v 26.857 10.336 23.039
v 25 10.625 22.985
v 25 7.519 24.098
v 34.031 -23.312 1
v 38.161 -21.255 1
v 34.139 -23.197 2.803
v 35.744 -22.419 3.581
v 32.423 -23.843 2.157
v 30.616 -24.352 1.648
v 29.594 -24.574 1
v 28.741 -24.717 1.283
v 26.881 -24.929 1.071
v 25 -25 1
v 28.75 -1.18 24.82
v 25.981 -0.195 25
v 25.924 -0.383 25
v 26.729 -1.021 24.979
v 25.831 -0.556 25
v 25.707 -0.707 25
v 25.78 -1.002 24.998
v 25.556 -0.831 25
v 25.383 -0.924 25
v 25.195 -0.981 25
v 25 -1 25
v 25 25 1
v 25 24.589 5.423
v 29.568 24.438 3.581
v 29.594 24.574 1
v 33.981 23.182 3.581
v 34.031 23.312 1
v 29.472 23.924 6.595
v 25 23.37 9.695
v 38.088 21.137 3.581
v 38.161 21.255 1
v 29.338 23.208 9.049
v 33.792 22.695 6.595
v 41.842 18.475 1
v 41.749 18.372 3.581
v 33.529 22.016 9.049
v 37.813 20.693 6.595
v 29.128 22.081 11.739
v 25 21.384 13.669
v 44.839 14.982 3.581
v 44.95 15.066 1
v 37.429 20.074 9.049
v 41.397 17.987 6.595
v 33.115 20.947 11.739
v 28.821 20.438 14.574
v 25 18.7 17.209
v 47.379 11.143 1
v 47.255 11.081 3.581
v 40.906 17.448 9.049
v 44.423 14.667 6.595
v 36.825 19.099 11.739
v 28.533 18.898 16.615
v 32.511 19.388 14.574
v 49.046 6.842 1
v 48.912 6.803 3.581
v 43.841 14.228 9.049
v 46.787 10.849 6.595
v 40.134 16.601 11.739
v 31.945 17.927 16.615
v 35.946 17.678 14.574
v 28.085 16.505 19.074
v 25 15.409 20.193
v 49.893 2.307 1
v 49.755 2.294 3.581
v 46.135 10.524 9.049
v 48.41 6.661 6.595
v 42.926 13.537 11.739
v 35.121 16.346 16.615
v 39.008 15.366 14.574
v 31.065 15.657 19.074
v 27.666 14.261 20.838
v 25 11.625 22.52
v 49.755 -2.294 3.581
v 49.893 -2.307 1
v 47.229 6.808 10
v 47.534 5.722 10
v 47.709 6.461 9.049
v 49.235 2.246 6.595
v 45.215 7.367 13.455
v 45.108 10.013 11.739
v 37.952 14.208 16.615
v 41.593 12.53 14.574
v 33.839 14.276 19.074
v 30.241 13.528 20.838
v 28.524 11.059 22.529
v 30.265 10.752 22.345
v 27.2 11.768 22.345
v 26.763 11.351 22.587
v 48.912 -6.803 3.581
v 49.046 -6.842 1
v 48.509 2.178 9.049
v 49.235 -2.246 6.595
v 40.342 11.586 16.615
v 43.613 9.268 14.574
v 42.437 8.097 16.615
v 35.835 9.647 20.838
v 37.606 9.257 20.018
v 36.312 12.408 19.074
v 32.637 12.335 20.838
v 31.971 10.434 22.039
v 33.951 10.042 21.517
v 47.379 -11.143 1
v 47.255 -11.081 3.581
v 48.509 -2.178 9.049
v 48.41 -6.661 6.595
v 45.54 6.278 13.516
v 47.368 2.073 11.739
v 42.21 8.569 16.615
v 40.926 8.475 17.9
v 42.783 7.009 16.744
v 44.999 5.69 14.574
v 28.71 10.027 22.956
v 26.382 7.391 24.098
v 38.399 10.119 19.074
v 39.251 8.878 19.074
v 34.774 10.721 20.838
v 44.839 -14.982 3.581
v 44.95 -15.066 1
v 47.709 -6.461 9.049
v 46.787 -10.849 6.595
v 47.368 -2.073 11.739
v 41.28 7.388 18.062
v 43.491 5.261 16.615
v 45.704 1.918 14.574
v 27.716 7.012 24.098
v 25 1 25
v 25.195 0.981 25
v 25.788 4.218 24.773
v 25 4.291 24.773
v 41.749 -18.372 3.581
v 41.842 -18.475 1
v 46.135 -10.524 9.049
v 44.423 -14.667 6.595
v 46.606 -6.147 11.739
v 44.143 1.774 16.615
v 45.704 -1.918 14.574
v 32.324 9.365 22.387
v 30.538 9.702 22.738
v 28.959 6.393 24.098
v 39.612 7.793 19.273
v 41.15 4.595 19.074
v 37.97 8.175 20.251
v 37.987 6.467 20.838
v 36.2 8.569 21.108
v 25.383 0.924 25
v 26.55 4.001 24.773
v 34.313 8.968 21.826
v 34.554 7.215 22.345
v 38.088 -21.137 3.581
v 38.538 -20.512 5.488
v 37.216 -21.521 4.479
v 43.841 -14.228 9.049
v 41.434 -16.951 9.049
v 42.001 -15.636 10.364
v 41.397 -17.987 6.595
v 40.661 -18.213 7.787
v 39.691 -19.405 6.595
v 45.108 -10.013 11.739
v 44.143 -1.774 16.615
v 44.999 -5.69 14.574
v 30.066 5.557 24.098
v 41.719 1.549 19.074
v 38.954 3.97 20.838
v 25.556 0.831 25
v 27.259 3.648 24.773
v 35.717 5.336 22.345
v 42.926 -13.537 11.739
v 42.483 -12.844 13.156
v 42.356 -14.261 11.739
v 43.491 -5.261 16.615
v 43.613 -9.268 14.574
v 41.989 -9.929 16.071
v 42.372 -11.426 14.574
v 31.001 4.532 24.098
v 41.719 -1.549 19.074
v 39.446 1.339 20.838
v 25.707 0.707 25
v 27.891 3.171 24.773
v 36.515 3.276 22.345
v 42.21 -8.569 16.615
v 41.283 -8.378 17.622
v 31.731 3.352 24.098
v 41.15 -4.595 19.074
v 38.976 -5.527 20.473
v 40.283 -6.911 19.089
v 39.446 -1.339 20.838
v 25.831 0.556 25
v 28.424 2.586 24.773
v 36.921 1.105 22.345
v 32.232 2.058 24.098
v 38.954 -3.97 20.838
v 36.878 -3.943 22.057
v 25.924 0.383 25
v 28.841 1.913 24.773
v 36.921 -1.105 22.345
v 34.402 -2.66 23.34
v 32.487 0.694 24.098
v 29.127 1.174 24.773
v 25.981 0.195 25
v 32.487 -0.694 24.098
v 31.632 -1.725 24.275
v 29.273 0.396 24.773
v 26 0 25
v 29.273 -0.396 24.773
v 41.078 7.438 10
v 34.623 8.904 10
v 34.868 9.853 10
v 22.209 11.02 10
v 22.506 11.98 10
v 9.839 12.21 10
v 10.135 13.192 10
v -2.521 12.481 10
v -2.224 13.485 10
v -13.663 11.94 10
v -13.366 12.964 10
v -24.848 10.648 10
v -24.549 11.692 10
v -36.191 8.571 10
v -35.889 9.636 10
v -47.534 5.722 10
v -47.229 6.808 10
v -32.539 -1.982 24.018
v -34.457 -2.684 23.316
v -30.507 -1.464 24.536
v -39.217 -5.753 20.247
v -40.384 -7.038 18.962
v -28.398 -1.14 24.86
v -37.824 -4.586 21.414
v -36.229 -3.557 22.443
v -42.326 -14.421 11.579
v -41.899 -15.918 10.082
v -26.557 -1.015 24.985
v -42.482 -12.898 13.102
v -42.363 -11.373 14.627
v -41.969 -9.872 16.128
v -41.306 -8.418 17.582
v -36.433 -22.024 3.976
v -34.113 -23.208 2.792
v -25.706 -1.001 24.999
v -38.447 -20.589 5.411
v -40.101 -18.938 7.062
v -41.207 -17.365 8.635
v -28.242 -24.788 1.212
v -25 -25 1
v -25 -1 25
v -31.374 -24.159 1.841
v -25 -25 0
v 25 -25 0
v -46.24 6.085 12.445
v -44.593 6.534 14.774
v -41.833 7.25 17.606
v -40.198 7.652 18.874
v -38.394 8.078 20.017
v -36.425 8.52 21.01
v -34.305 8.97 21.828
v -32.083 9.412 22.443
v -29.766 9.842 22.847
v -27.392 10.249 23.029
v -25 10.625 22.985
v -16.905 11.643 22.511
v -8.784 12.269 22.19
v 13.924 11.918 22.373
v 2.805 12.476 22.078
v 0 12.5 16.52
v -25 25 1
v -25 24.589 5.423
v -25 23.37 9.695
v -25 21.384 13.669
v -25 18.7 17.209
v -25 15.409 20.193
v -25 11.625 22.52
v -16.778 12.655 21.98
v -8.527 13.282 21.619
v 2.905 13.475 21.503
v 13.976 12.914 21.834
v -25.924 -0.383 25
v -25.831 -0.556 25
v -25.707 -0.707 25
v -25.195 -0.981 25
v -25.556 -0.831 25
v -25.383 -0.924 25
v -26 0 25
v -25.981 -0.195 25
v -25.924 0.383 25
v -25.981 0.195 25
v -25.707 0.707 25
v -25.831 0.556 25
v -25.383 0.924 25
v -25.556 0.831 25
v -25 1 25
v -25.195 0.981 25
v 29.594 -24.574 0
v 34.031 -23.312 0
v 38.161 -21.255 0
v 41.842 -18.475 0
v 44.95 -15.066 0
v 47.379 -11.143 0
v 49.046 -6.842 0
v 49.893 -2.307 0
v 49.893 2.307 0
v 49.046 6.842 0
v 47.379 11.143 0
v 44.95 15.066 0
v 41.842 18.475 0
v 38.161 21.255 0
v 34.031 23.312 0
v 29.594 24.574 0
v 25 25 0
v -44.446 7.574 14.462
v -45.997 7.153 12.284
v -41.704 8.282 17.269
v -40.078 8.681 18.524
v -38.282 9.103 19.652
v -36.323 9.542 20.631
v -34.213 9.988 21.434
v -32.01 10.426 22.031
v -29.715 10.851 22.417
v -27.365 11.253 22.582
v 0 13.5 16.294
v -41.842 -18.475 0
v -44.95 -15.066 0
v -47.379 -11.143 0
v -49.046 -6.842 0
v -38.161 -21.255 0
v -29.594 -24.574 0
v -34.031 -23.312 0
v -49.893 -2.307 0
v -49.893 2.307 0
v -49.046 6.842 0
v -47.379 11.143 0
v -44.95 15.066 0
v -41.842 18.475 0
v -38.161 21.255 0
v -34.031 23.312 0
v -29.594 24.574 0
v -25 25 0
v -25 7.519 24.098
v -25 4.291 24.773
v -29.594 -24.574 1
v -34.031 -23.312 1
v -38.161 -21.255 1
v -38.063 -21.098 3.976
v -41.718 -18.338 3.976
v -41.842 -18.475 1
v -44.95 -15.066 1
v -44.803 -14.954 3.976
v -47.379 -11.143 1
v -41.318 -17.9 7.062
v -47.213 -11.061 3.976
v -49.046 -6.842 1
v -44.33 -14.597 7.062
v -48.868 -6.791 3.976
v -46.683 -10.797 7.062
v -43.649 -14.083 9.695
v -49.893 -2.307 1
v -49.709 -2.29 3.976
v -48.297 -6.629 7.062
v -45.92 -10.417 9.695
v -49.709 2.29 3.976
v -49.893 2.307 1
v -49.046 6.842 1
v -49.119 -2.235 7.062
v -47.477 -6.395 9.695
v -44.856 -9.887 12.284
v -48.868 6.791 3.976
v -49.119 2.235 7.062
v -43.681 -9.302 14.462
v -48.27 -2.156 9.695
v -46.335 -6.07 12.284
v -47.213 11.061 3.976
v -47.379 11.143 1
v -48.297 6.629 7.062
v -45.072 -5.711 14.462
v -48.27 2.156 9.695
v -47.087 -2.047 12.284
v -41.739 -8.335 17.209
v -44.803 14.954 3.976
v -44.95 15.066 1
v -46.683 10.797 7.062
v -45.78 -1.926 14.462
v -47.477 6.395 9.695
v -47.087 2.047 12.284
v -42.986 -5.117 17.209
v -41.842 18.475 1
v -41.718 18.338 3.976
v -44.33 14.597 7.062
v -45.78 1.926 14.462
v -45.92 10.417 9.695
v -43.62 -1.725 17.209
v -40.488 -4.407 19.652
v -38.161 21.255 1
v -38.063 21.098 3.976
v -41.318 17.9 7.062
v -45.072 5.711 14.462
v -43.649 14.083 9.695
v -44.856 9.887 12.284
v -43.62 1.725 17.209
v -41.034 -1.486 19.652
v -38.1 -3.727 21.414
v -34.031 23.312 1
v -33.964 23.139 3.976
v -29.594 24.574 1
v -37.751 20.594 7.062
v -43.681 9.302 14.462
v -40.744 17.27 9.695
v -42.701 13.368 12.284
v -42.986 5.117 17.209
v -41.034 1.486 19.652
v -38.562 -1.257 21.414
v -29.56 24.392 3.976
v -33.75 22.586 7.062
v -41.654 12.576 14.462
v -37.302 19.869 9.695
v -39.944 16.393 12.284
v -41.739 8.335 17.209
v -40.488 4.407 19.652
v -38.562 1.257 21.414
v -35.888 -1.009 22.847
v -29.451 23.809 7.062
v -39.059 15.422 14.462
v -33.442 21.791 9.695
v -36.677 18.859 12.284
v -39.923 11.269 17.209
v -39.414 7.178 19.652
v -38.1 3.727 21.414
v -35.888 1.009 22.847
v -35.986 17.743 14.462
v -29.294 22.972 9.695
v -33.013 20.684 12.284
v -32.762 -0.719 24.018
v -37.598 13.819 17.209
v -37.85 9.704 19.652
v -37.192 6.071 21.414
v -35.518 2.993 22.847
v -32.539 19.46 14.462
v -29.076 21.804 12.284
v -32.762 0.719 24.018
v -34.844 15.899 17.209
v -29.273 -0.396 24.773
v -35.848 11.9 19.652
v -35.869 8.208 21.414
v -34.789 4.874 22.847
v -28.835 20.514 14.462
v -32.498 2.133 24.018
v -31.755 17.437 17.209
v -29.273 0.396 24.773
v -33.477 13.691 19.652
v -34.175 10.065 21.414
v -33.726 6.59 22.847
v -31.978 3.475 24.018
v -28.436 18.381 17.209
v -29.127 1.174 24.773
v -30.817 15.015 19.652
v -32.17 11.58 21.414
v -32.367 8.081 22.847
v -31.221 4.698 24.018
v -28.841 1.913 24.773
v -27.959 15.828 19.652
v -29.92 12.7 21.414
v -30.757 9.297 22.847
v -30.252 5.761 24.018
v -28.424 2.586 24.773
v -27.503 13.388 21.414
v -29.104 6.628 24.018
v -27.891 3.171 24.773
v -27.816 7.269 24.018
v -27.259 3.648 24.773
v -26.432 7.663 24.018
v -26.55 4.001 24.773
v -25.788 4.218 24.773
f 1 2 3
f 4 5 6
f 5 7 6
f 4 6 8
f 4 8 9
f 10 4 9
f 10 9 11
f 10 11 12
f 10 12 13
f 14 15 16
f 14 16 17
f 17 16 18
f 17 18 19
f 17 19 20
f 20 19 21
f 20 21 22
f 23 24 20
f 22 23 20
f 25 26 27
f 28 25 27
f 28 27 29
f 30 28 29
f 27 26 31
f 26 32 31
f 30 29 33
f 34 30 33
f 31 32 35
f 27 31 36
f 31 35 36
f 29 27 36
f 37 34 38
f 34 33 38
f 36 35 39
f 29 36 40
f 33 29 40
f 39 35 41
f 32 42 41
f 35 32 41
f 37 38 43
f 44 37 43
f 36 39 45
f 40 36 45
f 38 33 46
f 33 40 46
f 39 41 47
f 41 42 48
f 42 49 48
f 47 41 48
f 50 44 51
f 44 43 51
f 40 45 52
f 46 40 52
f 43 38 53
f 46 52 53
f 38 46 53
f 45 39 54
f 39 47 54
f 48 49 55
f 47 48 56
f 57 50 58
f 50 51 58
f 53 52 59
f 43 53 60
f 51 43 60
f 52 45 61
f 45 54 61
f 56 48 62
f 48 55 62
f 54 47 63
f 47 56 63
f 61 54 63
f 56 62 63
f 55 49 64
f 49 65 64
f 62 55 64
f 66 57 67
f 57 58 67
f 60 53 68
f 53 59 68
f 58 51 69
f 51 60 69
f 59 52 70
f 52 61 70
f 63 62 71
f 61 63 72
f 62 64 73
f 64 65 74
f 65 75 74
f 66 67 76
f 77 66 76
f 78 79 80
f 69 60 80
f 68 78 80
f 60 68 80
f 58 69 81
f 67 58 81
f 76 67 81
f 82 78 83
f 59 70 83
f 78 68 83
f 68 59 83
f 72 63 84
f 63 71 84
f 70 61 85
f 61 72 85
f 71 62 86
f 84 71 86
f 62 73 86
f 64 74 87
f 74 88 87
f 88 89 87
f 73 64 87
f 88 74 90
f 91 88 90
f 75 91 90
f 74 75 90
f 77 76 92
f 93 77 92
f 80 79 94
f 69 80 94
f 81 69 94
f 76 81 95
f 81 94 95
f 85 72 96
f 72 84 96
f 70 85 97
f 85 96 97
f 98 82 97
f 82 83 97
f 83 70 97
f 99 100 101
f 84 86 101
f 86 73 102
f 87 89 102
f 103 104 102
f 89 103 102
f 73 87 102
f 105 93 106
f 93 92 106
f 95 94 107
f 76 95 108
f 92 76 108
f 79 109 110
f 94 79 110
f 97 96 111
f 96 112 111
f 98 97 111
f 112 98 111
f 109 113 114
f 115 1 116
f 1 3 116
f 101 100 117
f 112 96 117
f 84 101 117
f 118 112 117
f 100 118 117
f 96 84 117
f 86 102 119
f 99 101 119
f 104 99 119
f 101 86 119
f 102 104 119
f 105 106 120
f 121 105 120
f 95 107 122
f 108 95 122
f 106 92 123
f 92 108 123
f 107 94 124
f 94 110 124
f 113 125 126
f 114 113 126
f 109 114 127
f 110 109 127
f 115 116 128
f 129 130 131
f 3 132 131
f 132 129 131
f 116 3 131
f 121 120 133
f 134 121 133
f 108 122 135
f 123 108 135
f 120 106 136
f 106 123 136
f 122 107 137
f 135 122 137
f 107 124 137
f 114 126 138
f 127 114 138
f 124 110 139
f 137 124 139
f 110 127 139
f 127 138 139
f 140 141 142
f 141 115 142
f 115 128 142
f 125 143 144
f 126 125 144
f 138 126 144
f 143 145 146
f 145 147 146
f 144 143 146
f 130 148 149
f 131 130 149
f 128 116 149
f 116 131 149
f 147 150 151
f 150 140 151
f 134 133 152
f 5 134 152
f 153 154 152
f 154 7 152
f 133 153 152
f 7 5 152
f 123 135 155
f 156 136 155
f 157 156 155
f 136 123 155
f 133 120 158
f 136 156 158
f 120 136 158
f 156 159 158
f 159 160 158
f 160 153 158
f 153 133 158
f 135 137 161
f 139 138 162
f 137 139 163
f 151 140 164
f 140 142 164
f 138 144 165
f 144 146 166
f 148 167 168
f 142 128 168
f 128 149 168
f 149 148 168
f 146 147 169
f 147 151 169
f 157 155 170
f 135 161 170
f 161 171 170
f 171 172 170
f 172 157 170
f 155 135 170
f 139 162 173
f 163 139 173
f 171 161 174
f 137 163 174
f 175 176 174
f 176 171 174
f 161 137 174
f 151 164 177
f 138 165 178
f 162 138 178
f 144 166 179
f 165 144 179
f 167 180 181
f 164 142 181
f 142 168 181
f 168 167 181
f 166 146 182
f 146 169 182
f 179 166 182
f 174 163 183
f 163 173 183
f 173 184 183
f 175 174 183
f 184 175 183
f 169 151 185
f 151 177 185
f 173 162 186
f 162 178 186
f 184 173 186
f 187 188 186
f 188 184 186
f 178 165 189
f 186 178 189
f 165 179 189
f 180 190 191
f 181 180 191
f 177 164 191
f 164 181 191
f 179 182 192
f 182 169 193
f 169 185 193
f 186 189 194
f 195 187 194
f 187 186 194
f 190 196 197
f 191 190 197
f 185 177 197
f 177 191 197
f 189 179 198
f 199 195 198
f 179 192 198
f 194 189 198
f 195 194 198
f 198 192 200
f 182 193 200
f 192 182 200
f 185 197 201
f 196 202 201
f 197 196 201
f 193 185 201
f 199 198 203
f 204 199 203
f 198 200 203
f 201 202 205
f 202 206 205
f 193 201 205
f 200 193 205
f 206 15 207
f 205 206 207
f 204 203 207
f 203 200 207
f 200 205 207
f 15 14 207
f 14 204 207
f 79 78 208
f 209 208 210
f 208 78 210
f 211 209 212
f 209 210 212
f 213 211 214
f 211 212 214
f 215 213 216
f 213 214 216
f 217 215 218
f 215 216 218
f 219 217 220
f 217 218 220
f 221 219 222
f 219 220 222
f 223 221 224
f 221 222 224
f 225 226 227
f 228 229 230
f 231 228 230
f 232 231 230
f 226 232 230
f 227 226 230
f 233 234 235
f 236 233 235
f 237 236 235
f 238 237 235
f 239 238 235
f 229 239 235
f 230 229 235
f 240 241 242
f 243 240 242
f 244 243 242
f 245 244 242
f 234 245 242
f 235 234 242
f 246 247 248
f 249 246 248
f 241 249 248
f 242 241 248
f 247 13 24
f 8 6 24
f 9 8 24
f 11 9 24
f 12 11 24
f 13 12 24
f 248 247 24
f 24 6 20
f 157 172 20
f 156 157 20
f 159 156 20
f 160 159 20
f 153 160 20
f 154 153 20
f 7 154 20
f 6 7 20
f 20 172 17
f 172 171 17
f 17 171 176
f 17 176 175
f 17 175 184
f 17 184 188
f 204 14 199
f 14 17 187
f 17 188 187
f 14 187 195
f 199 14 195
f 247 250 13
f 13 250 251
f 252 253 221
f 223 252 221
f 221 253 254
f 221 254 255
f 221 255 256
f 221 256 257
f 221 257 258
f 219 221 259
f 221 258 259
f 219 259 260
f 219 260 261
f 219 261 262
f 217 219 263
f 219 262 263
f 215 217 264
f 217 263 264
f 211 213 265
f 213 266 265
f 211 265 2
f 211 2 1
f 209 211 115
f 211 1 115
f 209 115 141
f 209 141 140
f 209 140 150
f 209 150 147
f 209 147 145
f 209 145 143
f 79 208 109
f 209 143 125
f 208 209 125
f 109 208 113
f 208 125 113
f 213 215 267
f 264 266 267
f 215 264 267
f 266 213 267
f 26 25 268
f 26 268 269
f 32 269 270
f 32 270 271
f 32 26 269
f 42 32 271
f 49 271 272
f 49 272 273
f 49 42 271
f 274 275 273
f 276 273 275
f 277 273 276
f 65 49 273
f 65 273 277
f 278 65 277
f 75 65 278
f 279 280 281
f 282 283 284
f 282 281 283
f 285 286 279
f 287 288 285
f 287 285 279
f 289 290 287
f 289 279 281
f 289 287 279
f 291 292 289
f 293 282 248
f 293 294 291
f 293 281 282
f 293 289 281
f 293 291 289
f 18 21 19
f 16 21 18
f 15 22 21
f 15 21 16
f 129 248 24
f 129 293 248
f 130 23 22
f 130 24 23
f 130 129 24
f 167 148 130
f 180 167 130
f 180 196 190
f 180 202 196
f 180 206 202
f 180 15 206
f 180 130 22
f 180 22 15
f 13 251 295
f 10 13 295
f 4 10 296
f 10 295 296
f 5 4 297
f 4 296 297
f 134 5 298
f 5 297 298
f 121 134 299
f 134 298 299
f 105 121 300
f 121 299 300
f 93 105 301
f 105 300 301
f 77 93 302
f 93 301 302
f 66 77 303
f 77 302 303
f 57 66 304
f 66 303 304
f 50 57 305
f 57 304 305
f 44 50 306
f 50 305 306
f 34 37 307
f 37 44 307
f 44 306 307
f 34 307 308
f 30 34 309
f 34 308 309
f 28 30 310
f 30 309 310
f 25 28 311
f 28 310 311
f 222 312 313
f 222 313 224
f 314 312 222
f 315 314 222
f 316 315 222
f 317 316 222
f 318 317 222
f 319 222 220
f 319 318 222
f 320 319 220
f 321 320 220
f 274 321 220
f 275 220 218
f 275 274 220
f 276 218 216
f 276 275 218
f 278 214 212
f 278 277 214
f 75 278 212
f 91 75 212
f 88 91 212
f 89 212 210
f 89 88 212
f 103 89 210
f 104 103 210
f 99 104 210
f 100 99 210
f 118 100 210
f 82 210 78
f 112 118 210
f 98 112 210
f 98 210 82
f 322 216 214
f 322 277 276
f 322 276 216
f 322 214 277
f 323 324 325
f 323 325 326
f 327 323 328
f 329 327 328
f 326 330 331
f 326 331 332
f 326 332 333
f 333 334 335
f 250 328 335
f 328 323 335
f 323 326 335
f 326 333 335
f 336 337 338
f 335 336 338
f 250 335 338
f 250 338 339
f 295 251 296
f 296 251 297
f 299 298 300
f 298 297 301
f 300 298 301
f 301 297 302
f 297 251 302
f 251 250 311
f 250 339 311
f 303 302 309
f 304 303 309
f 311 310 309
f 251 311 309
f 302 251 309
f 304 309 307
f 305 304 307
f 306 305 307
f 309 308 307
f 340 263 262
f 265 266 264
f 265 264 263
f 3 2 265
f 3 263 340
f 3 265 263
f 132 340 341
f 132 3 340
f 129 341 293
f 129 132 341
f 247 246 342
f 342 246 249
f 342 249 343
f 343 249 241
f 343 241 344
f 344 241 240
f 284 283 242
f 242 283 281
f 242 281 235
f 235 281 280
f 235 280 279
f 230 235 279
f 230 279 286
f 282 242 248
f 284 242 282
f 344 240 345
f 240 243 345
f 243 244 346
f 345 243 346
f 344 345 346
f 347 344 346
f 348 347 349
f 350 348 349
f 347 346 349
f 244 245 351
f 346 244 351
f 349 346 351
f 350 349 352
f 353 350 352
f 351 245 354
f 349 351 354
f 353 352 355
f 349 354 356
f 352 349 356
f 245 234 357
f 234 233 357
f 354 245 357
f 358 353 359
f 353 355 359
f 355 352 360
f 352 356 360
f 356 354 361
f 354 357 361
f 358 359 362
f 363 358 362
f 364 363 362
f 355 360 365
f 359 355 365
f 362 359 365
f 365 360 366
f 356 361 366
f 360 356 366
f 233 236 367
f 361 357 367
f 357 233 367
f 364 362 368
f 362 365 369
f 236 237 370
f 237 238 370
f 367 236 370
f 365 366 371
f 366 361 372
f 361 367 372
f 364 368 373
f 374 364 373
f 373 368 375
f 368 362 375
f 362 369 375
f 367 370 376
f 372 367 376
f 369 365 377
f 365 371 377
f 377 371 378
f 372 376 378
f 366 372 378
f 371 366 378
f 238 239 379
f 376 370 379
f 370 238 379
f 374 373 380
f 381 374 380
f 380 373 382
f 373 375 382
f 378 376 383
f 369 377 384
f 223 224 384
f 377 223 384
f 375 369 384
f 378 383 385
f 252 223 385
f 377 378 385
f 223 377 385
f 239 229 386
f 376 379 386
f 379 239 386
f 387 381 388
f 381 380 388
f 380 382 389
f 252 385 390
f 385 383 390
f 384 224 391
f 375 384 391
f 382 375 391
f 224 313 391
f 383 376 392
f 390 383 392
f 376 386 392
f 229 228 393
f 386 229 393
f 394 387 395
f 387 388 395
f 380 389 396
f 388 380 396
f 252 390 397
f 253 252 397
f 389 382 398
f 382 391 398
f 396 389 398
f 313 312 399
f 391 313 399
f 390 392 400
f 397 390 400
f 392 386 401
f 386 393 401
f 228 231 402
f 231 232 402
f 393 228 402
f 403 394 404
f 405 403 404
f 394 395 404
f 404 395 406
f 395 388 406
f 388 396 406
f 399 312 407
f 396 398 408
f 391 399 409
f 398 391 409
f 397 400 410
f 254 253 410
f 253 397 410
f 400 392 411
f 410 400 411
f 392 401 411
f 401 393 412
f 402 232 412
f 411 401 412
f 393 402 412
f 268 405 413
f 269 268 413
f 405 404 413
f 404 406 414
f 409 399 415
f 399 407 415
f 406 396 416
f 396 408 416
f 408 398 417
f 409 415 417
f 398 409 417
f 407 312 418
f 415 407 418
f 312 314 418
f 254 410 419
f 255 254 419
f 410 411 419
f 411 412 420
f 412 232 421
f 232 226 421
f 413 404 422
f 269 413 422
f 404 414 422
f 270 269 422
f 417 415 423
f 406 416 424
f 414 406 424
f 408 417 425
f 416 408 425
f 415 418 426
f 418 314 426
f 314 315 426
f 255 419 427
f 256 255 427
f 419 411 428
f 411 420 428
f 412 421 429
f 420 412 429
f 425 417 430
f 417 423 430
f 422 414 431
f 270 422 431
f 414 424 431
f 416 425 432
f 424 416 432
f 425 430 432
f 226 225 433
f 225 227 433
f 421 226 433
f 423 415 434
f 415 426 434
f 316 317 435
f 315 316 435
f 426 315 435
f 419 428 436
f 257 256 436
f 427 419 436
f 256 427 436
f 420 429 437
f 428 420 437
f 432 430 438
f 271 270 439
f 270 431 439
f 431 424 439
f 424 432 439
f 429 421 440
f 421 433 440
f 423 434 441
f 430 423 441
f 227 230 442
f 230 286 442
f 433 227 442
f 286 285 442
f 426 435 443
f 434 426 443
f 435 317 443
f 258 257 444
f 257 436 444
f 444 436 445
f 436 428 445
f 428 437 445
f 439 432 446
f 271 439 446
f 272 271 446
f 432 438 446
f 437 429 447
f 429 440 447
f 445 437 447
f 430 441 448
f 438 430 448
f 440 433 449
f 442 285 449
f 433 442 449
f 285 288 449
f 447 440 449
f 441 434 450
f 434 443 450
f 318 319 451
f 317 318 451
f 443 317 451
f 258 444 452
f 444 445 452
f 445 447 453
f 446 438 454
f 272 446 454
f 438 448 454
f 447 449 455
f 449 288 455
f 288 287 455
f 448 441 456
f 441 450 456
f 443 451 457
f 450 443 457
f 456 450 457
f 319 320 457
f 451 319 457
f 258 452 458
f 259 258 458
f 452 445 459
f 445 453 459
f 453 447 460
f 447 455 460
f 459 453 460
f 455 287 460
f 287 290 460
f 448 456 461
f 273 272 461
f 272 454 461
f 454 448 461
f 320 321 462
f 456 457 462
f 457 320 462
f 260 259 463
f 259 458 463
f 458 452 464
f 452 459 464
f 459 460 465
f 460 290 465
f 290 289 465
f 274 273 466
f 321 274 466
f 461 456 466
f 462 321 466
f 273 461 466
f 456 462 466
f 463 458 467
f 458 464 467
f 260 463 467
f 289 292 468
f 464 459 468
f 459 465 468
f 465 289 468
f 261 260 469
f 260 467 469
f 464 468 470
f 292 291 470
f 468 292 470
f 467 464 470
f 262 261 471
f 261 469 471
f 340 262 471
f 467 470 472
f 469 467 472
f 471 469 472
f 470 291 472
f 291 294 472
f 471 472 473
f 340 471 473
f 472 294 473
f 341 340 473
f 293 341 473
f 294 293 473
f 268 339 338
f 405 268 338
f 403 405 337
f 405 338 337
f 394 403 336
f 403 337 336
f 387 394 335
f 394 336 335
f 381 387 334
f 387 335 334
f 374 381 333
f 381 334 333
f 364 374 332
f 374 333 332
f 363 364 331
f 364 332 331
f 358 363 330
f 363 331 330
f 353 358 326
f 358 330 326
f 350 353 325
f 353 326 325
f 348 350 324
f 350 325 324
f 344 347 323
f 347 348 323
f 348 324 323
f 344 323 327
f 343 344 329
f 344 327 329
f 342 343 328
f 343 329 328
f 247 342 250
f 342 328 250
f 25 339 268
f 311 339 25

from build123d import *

# Parameters (mm, degrees)
PAD_DEPTH       = 25
FILLET_R        = 24
POCKET_DEPTH    = 100
POCKET001_DEPTH = 15


with BuildPart() as part:
    # Sketch → Pad (new body)
    with BuildSketch(Plane.XY):
        with BuildLine():
            ThreePointArc((-25, 25), (-50, 0), (-25, -25))
            Line((-25, -25), (25, -25))
            ThreePointArc((25, -25), (50, 0), (25, 25))
            Line((-25, 25), (25, 25))
        make_face()
    extrude(amount=PAD_DEPTH)

    # Fillet
    fillet_edges = [part.edges().sort_by_distance(p)[0] for p in [
        (0, 25, 25),
    ]]
    fillet(fillet_edges, radius=FILLET_R)

    # Sketch001 → Pocket (cut)
    with BuildSketch(Plane.YZ.offset(50)):
        Polygon((-25, 1), (0, 26), (-25, 26), align=None)
    extrude(amount=-POCKET_DEPTH, mode=Mode.SUBTRACT)

    # Sketch002 → Pocket001 (cut)
    with BuildSketch(Plane.XY.offset(25)):
        with BuildLine():
            Line((-50, 5), (-50, 6))
            add(Edge.make_bspline(
                [(-50, 6), (0, 21), (50, 6)],
                knots=[0, 0, 0, 1, 1, 1], degree=2))
            Line((50, 6), (50, 5))
            add(Edge.make_bspline(
                [(-50, 5), (0, 20), (50, 5)],
                knots=[0, 0, 0, 1, 1, 1], degree=2))
        make_face()
    extrude(amount=-POCKET001_DEPTH, mode=Mode.SUBTRACT)


solid = part.part
